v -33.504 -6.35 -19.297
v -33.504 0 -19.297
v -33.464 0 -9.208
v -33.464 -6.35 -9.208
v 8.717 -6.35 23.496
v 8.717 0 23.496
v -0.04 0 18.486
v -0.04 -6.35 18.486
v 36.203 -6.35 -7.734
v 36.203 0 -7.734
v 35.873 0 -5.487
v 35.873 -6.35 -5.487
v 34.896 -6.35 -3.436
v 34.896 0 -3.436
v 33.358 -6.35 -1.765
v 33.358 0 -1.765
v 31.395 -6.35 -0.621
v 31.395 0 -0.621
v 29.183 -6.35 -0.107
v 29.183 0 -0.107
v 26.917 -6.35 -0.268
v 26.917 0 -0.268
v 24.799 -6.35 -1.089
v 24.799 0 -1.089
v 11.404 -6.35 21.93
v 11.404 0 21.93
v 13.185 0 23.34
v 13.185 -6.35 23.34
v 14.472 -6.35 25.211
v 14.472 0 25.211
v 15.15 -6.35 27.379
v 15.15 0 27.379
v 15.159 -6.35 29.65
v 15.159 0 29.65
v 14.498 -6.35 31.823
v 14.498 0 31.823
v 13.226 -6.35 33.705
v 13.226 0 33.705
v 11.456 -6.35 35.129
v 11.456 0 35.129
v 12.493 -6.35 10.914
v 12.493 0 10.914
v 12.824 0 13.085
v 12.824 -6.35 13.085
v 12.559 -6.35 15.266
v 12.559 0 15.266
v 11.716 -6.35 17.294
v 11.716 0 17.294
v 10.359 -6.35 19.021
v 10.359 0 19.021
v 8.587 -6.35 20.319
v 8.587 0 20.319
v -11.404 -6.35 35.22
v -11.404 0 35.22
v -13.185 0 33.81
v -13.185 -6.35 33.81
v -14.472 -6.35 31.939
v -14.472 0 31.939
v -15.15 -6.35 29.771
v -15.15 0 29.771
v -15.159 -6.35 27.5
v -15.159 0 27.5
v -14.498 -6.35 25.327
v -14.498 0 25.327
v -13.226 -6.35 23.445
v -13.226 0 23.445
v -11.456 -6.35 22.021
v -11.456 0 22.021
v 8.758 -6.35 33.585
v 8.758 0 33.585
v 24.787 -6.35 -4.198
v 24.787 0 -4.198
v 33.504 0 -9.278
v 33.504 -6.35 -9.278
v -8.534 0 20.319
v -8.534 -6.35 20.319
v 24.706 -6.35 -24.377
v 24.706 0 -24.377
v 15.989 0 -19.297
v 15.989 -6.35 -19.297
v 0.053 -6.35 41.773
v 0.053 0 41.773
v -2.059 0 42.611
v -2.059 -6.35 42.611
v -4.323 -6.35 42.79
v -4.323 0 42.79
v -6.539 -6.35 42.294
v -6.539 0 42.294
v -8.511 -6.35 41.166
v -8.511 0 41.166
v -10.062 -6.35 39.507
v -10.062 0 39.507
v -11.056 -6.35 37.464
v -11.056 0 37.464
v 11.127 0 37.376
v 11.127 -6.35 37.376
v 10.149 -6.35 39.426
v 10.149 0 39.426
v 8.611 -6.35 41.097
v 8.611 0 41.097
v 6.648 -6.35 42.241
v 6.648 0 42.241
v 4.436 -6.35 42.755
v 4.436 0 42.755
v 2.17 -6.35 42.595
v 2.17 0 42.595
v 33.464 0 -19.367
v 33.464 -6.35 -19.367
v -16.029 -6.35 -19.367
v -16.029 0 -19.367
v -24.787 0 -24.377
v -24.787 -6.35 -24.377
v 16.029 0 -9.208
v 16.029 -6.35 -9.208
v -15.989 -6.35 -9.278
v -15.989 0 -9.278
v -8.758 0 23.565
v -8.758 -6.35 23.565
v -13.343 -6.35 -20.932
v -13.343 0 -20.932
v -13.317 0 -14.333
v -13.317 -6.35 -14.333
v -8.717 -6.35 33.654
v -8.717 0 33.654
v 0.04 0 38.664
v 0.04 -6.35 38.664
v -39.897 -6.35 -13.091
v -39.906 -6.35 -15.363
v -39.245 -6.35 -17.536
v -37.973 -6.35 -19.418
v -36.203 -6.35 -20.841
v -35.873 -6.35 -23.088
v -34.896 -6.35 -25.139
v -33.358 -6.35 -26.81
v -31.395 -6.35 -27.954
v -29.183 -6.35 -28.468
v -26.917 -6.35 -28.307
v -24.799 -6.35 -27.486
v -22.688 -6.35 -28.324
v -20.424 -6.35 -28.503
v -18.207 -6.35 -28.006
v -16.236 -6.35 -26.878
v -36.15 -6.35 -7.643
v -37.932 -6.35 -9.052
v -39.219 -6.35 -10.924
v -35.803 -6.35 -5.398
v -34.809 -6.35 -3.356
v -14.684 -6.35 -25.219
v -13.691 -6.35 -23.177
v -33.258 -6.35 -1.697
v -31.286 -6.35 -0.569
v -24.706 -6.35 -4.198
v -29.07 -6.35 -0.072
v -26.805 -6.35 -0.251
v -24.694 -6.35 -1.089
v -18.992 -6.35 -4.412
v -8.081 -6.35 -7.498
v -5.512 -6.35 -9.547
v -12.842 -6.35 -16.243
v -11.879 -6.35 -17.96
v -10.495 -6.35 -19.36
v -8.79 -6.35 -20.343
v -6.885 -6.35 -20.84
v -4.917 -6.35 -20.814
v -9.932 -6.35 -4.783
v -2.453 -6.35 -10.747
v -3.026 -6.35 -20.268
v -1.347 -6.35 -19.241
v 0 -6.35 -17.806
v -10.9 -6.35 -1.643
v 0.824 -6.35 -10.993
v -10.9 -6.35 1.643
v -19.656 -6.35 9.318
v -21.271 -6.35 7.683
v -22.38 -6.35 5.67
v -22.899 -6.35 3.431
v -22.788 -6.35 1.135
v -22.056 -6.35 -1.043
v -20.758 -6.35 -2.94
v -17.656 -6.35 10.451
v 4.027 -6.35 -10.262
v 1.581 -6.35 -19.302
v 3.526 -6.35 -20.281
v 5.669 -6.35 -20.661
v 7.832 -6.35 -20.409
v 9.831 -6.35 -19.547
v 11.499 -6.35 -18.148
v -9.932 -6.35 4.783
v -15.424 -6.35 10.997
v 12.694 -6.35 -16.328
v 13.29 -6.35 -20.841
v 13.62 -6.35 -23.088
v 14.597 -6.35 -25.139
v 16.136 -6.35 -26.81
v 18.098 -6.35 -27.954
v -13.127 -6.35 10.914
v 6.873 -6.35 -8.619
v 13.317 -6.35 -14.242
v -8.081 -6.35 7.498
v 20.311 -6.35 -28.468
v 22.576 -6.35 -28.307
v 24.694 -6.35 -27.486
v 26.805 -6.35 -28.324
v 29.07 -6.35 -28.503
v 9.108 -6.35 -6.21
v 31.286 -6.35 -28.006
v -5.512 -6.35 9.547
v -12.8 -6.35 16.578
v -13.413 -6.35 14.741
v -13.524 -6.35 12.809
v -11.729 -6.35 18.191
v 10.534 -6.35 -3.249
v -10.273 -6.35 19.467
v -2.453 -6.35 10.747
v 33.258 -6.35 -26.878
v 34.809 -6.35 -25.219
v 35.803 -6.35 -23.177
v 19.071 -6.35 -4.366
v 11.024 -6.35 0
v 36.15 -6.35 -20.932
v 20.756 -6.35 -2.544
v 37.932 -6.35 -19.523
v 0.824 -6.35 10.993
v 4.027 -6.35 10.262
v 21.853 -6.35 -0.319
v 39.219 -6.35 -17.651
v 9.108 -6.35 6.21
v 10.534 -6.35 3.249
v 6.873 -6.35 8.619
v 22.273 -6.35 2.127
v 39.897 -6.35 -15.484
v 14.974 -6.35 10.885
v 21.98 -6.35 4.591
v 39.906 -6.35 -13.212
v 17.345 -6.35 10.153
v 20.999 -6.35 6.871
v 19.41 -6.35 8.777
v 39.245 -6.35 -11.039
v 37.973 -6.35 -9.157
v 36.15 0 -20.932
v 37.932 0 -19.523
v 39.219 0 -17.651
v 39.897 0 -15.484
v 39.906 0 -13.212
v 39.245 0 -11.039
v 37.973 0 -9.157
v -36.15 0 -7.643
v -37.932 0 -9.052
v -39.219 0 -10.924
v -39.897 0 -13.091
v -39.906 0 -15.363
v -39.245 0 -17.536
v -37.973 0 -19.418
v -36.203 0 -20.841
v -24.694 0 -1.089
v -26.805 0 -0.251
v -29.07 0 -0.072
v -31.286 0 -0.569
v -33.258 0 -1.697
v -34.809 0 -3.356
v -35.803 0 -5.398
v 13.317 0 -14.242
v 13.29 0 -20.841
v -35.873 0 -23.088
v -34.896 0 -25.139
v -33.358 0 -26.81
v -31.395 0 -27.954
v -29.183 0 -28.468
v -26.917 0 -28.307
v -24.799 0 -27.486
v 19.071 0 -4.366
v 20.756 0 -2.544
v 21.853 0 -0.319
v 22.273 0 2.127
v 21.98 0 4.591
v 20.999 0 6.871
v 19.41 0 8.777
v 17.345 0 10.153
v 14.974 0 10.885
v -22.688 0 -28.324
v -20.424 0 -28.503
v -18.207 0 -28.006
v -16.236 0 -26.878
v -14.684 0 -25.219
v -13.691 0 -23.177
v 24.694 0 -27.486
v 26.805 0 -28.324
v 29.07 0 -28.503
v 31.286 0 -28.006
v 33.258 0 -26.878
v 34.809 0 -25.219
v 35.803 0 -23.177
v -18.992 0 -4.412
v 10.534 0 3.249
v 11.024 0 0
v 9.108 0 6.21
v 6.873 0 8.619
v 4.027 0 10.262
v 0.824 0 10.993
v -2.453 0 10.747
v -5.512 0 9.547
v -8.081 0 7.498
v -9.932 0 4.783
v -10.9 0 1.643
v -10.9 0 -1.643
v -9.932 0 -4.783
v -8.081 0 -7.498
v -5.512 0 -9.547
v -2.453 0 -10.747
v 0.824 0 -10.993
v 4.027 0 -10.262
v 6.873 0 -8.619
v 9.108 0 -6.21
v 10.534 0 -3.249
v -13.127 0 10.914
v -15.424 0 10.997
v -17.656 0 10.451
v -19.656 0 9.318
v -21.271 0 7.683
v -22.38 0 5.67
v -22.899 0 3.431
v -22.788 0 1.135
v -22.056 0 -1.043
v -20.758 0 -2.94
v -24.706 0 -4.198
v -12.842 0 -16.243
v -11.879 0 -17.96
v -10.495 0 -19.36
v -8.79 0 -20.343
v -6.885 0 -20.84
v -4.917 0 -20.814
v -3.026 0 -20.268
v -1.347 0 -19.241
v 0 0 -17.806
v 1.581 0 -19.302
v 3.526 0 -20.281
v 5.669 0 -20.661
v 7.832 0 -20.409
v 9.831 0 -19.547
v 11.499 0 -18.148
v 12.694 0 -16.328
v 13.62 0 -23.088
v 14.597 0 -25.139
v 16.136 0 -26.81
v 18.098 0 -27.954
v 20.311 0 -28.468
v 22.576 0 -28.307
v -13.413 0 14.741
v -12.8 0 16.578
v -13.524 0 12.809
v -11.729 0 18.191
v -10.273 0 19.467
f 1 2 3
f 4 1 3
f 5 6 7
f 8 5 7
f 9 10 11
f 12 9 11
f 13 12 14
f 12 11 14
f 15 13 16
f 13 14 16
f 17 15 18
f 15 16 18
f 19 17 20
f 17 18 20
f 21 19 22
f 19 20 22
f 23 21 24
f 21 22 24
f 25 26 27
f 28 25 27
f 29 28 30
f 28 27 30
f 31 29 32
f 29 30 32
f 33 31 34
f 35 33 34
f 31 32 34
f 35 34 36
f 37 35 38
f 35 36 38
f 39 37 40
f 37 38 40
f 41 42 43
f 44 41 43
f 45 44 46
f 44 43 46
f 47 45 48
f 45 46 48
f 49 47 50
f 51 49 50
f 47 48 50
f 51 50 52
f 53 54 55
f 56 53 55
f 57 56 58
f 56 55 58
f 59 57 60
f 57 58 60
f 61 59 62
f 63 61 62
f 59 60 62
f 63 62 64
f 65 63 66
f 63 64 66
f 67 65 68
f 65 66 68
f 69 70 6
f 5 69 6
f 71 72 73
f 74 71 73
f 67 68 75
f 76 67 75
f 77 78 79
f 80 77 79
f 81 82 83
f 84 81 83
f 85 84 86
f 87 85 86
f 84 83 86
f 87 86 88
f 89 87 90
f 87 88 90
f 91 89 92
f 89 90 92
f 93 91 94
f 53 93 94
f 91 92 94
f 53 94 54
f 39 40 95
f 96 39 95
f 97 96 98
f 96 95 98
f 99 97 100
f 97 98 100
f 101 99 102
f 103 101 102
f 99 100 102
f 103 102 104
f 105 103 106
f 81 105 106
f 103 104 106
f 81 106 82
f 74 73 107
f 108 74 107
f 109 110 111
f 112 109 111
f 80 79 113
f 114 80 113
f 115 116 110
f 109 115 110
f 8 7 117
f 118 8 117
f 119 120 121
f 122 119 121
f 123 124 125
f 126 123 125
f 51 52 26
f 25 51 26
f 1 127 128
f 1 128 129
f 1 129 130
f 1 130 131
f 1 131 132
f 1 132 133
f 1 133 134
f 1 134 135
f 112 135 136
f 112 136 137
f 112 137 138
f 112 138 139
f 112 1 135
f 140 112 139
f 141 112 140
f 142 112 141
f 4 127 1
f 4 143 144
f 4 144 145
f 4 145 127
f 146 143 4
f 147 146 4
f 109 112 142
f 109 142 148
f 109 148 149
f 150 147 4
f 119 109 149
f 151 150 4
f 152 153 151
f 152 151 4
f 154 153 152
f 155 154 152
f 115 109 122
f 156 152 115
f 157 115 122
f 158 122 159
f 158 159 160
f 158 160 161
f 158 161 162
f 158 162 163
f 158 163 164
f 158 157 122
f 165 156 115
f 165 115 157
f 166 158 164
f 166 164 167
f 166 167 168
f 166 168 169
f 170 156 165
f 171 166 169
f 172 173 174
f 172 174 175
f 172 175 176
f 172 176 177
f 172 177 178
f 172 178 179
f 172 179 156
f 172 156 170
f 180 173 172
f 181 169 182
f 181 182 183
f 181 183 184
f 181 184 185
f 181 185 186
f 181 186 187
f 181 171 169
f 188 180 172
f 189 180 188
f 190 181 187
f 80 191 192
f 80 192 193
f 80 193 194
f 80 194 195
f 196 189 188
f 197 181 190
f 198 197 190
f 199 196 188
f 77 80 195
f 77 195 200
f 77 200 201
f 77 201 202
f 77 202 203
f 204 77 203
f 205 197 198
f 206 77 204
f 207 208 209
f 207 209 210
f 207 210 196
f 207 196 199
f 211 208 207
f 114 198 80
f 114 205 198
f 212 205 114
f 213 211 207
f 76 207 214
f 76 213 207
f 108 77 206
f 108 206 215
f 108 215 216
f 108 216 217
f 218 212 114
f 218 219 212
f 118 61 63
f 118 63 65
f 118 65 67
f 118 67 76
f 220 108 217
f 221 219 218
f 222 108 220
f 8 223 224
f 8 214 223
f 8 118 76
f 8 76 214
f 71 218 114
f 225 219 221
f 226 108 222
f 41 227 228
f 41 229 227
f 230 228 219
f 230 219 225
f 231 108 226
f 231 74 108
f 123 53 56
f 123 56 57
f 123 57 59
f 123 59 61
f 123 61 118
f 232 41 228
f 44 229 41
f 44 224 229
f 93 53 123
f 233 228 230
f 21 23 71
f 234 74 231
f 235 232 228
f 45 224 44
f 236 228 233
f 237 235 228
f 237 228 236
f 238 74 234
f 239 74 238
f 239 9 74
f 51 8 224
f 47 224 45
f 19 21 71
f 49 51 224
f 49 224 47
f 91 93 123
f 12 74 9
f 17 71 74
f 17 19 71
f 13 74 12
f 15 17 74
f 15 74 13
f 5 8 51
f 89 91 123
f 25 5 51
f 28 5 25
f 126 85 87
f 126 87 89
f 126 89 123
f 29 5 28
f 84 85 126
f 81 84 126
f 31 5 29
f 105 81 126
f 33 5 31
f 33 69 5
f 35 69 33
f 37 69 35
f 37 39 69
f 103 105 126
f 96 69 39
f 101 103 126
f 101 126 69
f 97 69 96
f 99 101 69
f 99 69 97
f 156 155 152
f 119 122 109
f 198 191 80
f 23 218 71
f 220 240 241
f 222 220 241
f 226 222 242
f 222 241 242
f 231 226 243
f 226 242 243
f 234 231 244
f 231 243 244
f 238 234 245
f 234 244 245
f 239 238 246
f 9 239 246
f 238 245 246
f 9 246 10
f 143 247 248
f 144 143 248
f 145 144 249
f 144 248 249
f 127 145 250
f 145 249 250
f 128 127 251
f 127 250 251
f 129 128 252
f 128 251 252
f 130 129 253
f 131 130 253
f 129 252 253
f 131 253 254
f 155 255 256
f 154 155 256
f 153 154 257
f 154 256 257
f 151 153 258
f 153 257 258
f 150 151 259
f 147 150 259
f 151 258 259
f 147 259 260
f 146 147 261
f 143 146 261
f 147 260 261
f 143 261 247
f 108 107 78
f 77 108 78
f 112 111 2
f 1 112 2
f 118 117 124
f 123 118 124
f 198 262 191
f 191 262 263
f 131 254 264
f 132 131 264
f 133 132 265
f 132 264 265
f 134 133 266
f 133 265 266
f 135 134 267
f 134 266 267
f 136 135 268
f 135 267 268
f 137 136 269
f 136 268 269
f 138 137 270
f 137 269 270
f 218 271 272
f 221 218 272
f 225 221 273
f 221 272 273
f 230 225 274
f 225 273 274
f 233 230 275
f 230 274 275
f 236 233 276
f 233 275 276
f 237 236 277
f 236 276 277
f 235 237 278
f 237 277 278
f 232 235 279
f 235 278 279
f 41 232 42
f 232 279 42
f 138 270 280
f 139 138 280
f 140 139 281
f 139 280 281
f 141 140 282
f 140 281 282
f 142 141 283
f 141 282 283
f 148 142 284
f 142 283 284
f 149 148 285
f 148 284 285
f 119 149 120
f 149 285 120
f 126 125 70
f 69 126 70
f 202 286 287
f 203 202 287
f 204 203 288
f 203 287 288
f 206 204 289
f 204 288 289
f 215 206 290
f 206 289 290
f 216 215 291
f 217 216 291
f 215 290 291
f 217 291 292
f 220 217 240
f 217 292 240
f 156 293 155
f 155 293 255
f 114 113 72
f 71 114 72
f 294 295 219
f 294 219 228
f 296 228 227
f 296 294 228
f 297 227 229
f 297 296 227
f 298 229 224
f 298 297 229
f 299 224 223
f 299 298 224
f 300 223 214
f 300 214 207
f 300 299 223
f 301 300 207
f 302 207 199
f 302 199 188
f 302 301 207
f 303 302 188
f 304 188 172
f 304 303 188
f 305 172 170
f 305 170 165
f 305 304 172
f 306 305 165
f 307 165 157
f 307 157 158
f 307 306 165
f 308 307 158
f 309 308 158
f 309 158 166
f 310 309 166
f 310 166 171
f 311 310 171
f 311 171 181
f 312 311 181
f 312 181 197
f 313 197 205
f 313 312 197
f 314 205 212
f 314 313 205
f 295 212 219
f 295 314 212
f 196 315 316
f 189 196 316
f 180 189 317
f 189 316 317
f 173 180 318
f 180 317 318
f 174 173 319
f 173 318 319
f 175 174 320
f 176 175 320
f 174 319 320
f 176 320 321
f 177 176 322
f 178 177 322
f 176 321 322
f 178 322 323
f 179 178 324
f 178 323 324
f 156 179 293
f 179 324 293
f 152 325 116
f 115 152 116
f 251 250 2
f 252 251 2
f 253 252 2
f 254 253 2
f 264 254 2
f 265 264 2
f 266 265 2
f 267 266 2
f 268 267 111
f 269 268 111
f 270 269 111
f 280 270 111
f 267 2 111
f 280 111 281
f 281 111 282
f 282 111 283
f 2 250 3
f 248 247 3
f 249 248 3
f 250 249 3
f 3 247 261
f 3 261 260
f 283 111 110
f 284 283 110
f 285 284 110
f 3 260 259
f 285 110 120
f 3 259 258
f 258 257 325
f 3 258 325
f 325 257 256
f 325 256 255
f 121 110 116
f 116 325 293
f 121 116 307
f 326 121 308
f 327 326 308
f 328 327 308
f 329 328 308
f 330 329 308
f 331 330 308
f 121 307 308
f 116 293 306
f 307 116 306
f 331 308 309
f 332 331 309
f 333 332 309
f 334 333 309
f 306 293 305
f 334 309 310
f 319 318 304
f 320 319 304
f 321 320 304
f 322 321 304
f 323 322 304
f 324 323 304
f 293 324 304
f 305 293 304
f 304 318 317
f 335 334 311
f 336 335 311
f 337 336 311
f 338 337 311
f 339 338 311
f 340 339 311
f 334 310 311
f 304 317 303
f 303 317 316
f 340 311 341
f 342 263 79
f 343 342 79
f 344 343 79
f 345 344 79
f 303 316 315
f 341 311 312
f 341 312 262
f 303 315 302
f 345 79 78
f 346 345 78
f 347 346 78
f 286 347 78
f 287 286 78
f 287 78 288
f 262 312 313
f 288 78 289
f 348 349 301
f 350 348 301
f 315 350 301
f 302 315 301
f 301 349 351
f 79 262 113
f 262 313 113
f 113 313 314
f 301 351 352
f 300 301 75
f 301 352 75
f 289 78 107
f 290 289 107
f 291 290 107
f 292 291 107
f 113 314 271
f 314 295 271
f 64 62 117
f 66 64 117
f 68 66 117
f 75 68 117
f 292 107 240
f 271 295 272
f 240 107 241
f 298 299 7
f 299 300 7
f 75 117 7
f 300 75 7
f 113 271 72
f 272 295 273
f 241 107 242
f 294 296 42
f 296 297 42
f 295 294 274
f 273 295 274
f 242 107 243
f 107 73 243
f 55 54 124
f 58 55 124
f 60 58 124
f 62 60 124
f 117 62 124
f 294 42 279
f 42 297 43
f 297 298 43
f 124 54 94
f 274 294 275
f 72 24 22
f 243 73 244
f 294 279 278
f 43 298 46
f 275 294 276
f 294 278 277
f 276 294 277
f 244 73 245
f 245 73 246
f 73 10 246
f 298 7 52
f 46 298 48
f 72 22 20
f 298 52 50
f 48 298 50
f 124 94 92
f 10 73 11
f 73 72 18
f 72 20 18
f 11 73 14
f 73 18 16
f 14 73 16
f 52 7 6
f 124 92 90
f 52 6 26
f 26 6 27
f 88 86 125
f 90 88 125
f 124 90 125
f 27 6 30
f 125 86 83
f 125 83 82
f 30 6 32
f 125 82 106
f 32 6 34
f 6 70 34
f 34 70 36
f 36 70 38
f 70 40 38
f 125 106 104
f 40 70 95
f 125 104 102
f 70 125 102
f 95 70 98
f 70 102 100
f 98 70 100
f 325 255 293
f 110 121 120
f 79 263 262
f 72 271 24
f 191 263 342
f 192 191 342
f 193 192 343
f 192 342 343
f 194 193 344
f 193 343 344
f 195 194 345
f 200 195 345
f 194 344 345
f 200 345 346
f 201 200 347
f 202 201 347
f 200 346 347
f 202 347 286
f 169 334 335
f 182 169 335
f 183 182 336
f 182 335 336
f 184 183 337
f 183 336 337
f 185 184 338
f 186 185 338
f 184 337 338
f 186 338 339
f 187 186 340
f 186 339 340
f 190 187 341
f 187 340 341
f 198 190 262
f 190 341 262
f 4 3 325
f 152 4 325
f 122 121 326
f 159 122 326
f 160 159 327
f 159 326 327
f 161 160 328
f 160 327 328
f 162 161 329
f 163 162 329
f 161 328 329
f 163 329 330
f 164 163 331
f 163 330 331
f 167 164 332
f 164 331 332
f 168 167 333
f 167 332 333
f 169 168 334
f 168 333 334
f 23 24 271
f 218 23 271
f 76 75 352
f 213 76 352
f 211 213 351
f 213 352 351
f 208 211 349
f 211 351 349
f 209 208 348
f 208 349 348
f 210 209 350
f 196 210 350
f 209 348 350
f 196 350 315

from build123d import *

# Parameters (mm, degrees)
F0_R     = 14.2875
F0_R_2   = 11.0236
F1_DEPTH = 6.35


with BuildPart() as f1:
    # F0 (on Front) → F1 (new body)
    with BuildSketch(Plane.XZ):
        with BuildLine():
            ThreePointArc((0.052564, 41.773122), (-7.567375, 41.80347), (-11.403627, 35.219583))
            Line((-11.403627, 35.219583), (0.052564, 41.773122))
        make_face()
        Polygon((0.052564, 41.773122), (-11.403627, 35.219583), (-11.456191, 22.021461), (-8.534462, 20.319048), (-0.052564, 15.376878), (8.586806, 20.319048), (11.403627, 21.930417), (11.456191, 35.128539), align=None)
        Polygon((-8.757622, 23.565183), (-8.71744, 33.654415), (0.040182, 38.664231), (8.757622, 33.584817), (8.71744, 23.495585), (-0.040182, 18.485769), align=None, mode=Mode.SUBTRACT)
        with BuildLine():
            Line((-11.456191, 22.021461), (-11.403627, 35.219583))
            ThreePointArc((-11.403627, 35.219583), (-15.239879, 28.635696), (-11.456191, 22.021461))
        make_face()
        with BuildLine():
            ThreePointArc((11.456191, 35.128539), (7.672504, 41.742775), (0.052564, 41.773122))
            Line((0.052564, 41.773122), (11.456191, 35.128539))
        make_face()
        with BuildLine():
            ThreePointArc((11.403627, 21.930417), (15.239879, 28.514304), (11.456191, 35.128539))
            Line((11.456191, 35.128539), (11.403627, 21.930417))
        make_face()
        with BuildLine():
            Line((-0.052564, 15.376878), (-8.534462, 20.319048))
            ThreePointArc((-8.534462, 20.319048), (-12.800156, 16.577999), (-13.126936, 10.913654))
            ThreePointArc((-13.126936, 10.913654), (-22.380073, 5.66998), (-18.992298, -4.411669))
            Line((-18.992298, -4.411669), (-13.290484, -7.733961))
            Line((-13.290484, -7.733961), (-13.316767, -14.333022))
            ThreePointArc((-13.316767, -14.333022), (-7.854296, -20.65549), (0, -17.805539))
            ThreePointArc((0, -17.805539), (7.832001, -20.409484), (13.316767, -14.241978))
            Line((13.316767, -14.241978), (13.343049, -7.642917))
            Line((13.343049, -7.642917), (19.071144, -4.366147))
            ThreePointArc((19.071144, -4.366147), (21.571506, 5.766311), (12.492773, 10.913654))
            ThreePointArc((12.492773, 10.913654), (12.206621, 16.30857), (8.586806, 20.319048))
            Line((8.586806, 20.319048), (-0.052564, 15.376878))
        make_face()
        Circle(F0_R, mode=Mode.SUBTRACT)
        Polygon((-13.290484, -7.733961), (-18.992298, -4.411669), (-24.694112, -1.089378), (-36.150303, -7.642917), (-36.202867, -20.841039), (-24.79924, -27.485622), (-13.343049, -20.932083), (-13.316767, -14.333022), align=None)
        Polygon((-33.464115, -9.208085), (-24.706494, -4.198269), (-15.989054, -9.277683), (-16.029236, -19.366915), (-24.786858, -24.376731), (-33.504298, -19.297317), align=None, mode=Mode.SUBTRACT)
        with BuildLine():
            Line((-36.150303, -7.642917), (-24.694112, -1.089378))
            ThreePointArc((-24.694112, -1.089378), (-32.314051, -1.05903), (-36.150303, -7.642917))
        make_face()
        Polygon((24.79924, -1.089378), (19.071144, -4.366147), (13.343049, -7.642917), (13.316767, -14.241978), (13.290484, -20.841039), (24.694112, -27.485622), (36.150303, -20.932083), (36.202867, -7.733961), align=None)
        Polygon((24.706494, -24.376731), (15.989054, -19.297317), (16.029236, -9.208085), (24.786858, -4.198269), (33.504298, -9.277683), (33.464115, -19.366915), align=None, mode=Mode.SUBTRACT)
        with BuildLine():
            Line((-36.202867, -20.841039), (-36.150303, -7.642917))
            ThreePointArc((-36.150303, -7.642917), (-39.986555, -14.226804), (-36.202867, -20.841039))
        make_face()
        with BuildLine():
            ThreePointArc((36.202867, -7.733961), (32.41918, -1.119725), (24.79924, -1.089378))
            Line((24.79924, -1.089378), (36.202867, -7.733961))
        make_face()
        with BuildLine():
            Line((-24.79924, -27.485622), (-36.202867, -20.841039))
            ThreePointArc((-36.202867, -20.841039), (-32.41918, -27.455275), (-24.79924, -27.485622))
        make_face()
        with BuildLine():
            ThreePointArc((-24.79924, -27.485622), (-17.1793, -27.51597), (-13.343049, -20.932083))
            Line((-13.343049, -20.932083), (-24.79924, -27.485622))
        make_face()
        with BuildLine():
            ThreePointArc((36.150303, -20.932083), (39.986555, -14.348196), (36.202867, -7.733961))
            Line((36.202867, -7.733961), (36.150303, -20.932083))
        make_face()
        with BuildLine():
            Line((24.694112, -27.485622), (13.290484, -20.841039))
            ThreePointArc((13.290484, -20.841039), (17.074172, -27.455275), (24.694112, -27.485622))
        make_face()
        with BuildLine():
            ThreePointArc((24.694112, -27.485622), (32.314051, -27.51597), (36.150303, -20.932083))
            Line((36.150303, -20.932083), (24.694112, -27.485622))
        make_face()
        Circle(F0_R)
        Circle(F0_R_2, mode=Mode.SUBTRACT)
    extrude(amount=F1_DEPTH)


solid = f1.part
